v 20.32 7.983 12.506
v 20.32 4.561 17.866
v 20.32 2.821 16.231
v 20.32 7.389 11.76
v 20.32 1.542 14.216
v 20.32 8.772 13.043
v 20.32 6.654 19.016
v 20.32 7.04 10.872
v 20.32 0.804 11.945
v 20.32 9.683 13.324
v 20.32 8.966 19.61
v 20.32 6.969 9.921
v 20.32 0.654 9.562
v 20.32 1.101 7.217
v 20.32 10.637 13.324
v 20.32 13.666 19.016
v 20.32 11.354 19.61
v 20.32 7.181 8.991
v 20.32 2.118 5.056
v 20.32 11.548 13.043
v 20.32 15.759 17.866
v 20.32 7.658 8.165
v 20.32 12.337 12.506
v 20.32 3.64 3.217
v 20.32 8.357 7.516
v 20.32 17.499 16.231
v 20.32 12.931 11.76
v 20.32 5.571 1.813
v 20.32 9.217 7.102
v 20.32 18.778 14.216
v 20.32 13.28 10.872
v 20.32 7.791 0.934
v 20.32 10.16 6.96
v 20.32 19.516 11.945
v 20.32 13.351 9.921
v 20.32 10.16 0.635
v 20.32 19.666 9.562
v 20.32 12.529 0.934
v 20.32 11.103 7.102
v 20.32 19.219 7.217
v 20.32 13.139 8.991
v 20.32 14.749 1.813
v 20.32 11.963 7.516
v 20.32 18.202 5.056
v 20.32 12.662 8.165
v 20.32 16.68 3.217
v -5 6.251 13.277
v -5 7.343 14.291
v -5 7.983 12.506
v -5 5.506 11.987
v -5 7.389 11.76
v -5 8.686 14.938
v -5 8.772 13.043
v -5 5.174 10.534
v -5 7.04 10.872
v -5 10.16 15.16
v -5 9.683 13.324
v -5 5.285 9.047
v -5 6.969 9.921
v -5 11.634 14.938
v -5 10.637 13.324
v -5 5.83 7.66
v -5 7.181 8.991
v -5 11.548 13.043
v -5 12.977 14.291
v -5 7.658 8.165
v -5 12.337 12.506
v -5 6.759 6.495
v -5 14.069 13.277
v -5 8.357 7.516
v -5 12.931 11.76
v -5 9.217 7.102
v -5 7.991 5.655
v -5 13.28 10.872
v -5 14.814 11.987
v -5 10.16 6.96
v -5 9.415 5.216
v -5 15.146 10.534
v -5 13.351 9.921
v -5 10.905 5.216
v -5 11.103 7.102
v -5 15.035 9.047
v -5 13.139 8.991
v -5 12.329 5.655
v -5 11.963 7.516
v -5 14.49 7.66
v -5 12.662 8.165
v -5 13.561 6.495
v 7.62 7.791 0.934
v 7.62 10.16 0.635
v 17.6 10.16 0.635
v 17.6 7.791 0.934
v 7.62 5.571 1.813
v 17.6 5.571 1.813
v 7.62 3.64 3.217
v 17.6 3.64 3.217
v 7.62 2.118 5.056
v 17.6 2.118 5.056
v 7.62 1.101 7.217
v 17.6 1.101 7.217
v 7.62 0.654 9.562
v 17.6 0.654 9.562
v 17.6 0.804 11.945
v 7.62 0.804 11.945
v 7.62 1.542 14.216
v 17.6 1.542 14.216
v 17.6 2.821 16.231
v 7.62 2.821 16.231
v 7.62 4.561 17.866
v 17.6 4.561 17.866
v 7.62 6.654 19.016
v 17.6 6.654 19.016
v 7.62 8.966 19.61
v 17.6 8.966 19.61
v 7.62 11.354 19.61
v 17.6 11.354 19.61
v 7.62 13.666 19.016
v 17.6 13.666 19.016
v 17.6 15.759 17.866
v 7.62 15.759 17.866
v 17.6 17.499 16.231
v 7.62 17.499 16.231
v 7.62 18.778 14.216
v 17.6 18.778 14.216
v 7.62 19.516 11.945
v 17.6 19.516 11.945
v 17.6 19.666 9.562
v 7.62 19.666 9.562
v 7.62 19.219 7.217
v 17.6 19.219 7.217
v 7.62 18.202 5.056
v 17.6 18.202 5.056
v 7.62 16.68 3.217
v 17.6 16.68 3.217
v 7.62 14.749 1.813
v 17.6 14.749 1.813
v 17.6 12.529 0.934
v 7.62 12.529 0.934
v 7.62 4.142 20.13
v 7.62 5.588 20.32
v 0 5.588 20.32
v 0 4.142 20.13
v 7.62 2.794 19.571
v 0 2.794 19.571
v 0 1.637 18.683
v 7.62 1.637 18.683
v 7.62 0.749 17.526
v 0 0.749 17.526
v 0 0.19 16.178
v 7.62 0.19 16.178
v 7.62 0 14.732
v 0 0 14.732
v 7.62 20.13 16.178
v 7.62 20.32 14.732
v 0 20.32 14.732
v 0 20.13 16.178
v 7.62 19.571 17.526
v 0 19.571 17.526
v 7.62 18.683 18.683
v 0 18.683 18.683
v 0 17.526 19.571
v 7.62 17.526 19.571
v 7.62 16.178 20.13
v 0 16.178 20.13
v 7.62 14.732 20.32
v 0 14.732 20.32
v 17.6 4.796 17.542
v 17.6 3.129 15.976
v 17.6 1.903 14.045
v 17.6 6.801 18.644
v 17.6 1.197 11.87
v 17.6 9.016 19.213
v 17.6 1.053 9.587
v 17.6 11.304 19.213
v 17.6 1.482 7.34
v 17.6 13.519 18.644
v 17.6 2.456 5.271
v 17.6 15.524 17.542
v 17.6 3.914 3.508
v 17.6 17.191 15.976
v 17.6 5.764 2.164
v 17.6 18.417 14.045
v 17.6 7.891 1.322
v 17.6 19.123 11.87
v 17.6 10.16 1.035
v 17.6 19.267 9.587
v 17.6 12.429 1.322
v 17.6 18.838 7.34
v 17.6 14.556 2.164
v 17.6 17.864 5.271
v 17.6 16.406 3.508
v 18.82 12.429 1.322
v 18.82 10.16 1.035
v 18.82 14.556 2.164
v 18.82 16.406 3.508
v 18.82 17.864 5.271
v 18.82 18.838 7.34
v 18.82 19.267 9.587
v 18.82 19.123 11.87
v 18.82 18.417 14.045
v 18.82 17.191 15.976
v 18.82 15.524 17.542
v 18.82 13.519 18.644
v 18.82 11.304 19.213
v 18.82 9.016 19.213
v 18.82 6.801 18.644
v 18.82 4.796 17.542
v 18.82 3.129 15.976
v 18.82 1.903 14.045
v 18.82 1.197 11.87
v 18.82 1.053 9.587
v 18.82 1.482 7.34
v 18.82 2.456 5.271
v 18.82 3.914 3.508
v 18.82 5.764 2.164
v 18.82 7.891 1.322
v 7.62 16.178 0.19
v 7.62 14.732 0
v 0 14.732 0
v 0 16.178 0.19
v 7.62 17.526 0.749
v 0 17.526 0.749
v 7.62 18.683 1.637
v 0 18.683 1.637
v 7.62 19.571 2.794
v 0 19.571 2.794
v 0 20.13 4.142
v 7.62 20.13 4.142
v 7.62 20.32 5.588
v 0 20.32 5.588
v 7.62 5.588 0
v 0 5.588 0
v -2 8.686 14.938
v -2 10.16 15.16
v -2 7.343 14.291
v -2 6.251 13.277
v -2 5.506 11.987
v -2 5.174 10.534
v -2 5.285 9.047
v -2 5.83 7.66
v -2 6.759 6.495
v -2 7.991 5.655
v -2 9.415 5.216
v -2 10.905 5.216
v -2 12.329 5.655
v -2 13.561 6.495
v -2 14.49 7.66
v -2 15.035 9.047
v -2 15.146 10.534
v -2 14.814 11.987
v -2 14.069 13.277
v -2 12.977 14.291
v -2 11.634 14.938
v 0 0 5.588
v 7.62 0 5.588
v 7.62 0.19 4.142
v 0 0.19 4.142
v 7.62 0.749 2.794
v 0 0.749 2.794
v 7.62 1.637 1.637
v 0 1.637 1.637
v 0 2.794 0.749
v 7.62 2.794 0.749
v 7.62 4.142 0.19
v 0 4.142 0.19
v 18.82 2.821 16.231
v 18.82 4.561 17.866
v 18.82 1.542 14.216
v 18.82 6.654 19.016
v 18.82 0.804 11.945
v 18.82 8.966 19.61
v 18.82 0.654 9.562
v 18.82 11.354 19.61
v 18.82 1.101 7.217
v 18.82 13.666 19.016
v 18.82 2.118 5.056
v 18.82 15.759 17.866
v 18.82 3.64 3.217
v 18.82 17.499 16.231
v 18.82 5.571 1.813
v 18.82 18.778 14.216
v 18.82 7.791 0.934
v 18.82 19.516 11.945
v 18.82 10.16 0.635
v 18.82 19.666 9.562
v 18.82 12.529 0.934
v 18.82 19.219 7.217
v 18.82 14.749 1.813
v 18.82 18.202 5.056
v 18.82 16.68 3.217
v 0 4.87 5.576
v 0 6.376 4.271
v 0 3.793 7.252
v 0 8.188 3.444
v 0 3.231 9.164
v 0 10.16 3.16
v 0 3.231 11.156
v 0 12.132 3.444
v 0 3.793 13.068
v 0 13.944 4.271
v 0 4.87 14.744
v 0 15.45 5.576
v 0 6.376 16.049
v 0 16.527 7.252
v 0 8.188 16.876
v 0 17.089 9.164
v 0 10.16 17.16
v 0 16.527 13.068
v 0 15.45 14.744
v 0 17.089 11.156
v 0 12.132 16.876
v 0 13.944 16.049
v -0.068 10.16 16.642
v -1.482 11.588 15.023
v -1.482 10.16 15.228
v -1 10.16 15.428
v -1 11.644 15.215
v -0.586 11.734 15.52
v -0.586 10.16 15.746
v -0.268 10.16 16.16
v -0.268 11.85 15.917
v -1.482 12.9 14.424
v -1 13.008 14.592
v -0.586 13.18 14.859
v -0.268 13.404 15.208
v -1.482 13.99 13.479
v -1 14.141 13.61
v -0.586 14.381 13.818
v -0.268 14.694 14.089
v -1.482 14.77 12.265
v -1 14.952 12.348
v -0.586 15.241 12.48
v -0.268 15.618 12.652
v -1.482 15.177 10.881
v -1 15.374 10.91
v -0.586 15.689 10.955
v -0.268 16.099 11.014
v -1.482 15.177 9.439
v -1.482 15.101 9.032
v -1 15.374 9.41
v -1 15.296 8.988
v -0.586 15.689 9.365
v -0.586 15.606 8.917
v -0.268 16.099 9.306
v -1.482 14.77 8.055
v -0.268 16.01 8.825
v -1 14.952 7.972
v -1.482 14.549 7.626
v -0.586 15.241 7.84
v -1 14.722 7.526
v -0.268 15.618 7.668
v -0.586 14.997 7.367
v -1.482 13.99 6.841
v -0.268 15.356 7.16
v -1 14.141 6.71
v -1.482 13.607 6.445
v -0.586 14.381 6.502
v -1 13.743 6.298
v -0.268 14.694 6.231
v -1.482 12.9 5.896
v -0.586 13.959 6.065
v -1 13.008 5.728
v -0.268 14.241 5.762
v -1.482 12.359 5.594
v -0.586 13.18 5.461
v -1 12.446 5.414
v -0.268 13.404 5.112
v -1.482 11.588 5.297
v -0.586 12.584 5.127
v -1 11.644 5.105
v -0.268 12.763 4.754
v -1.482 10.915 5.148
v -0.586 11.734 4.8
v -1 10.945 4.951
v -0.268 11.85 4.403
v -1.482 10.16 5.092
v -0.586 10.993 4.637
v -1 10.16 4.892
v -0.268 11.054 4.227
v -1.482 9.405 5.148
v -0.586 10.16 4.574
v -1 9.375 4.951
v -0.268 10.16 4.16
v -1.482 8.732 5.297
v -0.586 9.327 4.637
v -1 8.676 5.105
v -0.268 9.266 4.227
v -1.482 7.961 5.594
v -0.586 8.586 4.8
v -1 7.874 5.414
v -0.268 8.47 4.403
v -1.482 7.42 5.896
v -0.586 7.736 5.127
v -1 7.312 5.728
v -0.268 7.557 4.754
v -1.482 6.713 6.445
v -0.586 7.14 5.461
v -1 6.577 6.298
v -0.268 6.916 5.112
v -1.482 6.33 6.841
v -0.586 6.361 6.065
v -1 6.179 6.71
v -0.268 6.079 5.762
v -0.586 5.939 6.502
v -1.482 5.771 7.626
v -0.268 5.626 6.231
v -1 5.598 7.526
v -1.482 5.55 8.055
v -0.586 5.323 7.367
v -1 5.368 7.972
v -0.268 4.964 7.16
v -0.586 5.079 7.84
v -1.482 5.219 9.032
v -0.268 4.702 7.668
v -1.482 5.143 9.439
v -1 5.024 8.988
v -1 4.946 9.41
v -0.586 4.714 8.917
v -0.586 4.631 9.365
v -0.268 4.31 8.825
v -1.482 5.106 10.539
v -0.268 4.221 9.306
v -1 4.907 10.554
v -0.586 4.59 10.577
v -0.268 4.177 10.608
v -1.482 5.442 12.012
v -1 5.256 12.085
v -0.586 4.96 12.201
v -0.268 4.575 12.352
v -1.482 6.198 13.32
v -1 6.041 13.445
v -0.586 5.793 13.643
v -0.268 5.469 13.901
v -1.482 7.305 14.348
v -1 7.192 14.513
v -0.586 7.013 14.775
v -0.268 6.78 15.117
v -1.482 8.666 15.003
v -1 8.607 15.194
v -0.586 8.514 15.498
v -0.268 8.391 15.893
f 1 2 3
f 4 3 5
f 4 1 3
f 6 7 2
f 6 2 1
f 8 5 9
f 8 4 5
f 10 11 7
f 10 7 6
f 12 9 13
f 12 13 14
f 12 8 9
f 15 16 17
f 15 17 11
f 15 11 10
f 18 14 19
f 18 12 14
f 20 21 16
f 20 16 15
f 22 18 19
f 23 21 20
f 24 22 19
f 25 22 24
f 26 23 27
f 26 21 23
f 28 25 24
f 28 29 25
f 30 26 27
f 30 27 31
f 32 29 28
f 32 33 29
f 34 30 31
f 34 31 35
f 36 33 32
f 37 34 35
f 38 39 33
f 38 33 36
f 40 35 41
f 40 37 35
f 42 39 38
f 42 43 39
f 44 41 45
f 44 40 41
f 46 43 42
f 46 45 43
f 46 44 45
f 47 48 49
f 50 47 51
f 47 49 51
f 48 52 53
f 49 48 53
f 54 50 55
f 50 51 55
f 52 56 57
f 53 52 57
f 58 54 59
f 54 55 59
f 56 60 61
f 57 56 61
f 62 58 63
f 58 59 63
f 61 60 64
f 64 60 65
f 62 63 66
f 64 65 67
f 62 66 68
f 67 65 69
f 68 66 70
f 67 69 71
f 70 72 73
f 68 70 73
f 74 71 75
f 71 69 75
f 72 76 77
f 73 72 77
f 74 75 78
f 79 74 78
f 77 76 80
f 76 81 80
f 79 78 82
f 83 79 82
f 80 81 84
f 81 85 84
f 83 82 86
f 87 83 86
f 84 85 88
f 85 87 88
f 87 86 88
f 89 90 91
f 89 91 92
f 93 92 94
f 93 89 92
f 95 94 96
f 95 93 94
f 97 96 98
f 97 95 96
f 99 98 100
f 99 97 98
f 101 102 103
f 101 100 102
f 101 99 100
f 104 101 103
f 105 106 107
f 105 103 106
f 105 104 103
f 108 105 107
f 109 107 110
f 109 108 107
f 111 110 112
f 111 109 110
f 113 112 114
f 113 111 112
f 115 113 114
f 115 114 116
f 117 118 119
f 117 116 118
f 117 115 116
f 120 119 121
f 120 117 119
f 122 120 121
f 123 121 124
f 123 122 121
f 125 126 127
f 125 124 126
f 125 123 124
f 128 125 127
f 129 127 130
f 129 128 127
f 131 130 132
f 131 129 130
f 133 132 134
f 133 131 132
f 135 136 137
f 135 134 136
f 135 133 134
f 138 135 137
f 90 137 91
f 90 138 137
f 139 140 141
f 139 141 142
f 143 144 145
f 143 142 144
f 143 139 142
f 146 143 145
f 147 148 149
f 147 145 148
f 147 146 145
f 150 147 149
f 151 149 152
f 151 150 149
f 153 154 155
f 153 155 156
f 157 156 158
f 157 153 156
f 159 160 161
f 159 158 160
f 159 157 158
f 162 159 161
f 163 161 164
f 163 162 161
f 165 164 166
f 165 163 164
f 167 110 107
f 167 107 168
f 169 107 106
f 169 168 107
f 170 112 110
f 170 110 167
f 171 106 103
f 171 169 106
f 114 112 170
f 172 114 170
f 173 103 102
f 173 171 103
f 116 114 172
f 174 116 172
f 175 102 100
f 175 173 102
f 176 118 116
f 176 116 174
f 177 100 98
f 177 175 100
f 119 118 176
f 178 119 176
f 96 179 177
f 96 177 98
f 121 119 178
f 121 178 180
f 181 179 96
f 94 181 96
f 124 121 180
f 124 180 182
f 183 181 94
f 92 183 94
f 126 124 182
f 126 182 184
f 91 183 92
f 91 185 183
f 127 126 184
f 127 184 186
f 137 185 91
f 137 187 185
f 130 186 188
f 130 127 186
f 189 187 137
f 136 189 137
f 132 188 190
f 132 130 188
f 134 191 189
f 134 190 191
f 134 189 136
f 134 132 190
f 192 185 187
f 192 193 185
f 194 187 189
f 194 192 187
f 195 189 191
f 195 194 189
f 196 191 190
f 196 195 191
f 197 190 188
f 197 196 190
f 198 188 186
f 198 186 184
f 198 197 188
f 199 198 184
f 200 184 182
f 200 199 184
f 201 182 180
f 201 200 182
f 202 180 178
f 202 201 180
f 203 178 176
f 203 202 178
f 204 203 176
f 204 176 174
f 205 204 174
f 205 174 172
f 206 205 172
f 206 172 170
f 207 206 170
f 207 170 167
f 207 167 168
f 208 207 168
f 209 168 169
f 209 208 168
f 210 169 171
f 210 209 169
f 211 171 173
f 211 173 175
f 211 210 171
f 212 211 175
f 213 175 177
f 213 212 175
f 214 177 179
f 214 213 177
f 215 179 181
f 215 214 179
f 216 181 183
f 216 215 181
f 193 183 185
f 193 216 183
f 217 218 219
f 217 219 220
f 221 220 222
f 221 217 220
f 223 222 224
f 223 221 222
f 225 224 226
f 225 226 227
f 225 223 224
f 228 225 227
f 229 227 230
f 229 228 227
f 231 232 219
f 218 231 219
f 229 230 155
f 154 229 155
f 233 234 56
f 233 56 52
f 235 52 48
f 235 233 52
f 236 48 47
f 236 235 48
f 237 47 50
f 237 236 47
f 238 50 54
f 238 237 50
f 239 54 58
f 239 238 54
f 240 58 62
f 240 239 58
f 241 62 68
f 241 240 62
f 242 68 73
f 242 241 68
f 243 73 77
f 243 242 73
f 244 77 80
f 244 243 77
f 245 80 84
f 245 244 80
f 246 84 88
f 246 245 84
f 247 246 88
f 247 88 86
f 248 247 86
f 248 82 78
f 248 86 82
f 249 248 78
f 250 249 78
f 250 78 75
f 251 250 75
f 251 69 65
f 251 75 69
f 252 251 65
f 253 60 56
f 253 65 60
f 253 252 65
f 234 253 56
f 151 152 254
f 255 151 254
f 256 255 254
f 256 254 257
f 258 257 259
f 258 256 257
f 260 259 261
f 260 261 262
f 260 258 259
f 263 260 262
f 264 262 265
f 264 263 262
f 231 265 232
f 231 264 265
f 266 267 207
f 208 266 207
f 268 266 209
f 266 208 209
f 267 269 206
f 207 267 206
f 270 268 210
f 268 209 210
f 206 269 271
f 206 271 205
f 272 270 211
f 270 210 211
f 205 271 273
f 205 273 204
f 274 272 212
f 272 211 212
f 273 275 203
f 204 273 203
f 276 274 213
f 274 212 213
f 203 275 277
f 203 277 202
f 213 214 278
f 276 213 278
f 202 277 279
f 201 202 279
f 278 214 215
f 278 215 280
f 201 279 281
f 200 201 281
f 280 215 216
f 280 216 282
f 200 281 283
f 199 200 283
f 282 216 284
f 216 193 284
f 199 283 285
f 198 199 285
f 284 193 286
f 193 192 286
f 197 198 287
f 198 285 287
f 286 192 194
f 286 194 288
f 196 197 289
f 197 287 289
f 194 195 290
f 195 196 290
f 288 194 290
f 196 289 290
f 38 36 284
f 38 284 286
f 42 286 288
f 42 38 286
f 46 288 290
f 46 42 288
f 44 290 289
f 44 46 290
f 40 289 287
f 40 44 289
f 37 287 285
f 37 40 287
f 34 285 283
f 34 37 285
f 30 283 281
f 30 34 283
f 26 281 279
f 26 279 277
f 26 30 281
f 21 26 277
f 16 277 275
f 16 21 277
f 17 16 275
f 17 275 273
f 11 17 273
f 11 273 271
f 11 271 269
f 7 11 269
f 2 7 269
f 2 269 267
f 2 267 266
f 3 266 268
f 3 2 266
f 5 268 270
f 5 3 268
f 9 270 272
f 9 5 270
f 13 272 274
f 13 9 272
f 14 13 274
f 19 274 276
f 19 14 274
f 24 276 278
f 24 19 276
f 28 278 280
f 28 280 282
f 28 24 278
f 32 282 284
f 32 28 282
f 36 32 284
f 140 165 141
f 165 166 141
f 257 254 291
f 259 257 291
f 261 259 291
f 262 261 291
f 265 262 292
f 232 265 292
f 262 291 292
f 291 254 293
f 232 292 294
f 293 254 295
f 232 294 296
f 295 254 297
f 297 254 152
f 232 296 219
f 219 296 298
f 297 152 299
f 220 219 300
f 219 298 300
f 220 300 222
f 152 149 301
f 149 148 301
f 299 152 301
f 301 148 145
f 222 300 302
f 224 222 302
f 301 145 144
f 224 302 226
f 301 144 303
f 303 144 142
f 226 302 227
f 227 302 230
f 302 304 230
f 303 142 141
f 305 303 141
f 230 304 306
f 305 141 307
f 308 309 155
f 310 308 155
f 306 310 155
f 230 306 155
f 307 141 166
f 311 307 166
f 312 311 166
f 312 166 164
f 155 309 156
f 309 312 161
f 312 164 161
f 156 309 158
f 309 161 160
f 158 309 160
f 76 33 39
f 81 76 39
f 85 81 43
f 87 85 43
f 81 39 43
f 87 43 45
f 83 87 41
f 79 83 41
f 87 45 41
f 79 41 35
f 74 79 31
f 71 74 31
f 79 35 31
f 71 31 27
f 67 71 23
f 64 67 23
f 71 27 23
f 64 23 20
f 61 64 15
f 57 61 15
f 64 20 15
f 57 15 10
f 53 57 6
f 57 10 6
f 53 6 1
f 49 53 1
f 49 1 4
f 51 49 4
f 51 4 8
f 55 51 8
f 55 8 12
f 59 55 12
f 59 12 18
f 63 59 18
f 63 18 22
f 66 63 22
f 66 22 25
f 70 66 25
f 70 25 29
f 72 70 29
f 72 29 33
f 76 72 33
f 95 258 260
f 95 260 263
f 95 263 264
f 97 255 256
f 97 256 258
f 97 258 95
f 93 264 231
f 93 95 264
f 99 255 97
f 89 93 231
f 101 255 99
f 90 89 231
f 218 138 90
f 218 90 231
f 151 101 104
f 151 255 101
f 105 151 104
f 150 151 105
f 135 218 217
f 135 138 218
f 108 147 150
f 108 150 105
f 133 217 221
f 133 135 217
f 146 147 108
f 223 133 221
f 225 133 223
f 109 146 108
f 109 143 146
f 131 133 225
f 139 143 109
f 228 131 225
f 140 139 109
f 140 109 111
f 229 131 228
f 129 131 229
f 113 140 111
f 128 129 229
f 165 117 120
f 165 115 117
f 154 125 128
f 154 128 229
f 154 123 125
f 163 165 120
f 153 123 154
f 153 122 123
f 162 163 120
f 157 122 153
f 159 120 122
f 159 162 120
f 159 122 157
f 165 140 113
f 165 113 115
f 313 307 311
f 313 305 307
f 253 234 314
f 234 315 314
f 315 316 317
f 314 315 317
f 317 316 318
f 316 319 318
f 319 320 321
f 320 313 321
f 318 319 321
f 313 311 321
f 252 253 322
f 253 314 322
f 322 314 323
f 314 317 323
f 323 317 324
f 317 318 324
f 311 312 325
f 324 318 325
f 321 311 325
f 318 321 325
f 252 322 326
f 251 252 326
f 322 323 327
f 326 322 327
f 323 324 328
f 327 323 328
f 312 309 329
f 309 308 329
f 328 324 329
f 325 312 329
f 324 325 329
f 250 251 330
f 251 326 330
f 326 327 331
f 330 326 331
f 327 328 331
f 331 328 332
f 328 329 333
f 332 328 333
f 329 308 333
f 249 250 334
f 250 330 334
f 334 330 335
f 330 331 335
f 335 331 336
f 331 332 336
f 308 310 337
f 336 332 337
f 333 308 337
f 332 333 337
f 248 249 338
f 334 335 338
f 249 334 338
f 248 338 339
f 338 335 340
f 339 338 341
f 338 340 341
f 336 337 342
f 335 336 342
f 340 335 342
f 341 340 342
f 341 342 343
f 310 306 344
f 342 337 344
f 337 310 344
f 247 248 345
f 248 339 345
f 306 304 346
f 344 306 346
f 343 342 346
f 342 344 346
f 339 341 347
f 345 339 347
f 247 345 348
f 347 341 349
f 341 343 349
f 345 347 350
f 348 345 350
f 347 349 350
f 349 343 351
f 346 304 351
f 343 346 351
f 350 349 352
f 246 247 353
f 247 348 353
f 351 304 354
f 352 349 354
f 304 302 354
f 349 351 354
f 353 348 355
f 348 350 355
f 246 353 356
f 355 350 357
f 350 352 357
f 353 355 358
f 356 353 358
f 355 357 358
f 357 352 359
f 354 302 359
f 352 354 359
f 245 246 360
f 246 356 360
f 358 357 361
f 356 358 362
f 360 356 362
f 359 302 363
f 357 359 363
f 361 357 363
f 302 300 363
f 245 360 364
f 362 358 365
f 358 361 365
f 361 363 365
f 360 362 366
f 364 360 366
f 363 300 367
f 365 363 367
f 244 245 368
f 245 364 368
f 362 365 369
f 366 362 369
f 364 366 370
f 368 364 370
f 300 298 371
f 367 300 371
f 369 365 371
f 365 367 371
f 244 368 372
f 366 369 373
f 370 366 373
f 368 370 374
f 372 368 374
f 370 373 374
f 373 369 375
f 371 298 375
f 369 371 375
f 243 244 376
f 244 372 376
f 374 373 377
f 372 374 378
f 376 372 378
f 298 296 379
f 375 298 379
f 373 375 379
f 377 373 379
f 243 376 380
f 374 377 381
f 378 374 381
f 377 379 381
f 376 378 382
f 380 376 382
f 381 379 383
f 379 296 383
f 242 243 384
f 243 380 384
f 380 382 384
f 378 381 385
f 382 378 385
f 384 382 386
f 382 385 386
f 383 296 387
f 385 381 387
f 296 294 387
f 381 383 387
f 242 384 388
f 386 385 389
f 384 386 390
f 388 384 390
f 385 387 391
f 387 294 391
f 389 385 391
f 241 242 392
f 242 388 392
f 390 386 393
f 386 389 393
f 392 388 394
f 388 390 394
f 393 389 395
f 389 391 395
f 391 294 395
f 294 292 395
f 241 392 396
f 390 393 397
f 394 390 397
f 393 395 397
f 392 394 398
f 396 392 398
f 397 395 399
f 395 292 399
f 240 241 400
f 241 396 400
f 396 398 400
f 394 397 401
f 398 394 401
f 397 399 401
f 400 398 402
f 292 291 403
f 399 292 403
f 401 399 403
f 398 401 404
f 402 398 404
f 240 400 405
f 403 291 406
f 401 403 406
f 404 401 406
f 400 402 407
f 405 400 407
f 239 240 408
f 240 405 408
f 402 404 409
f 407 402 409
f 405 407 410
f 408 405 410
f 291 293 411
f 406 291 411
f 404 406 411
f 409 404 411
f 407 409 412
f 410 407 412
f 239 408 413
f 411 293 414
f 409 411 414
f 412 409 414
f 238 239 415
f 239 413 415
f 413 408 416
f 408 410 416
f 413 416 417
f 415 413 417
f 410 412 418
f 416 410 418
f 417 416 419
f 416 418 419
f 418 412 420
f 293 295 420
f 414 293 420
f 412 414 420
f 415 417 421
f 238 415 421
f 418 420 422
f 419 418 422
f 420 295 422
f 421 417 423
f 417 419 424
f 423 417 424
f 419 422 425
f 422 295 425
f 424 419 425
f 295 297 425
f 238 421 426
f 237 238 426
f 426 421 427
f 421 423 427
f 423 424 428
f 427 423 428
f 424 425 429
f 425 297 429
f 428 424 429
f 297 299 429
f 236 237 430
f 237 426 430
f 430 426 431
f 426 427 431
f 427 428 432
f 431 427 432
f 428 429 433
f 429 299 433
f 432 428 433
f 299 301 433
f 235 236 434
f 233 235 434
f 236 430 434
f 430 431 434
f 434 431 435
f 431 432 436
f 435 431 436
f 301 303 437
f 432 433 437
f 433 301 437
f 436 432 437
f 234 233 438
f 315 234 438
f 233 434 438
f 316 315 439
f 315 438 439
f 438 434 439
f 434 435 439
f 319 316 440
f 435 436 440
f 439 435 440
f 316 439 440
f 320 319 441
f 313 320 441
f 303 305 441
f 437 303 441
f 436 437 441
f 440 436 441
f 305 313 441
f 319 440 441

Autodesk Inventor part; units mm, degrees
ref_plane "YZ Plane" through (0, 0, 0) normal (1, 0, 0) x (0, 1, 0)
ref_plane "XZ Plane" through (0, 0, 0) normal (0, 1, 0) x (-1, 0, 0)
ref_plane "XY Plane" through (0, 0, 0) normal (0, 0, 1) x (1, 0, 0)
sketch "Sketch1" plane through (0, 0, 0) normal (1, 0, 0) x (0, 1, 0)
  line L0 (0, 0) -> (20.32, 0)
  line L1 (20.32, 0) -> (20.32, 20.32)
  line L2 (20.32, 20.32) -> (0, 20.32)
  line L3 (0, 20.32) -> (0, 0)
  dimension "d0" = 20.32
  dimension "d1" = 20.32
extrude "Extrusion1" add sketch "Sketch1" along normal blind 7.62
sketch "Sketch2" plane through (7.62, 0, 0) normal (1, 0, 0) x (0, 0, -1)
  circle A0 centre (-10.16, 10.16) radius 9.525
  point P0 (0, 0)
  dimension "d4" = 19.05
extrude "Extrusion2" add sketch "Sketch2" along normal blind 12.7
fillet "Fillet1" radius 5.588 4 edges at (3.81, 20.32, 0) (3.81, 0, 0) (3.81, 0, 20.32) (3.81, 20.32, 20.32)
sketch "Sketch3" plane through (20.32, 10.16, 10.16) normal (1, 0, 0) x (0, 0, -1)
  circle A0 centre (0, 0) radius 9.525
  circle A1 centre (0, 0) radius 9.125
  point P0 (10.16, -10.16)
  dimension "d8" = 18.25
extrude "Extrusion3" cut sketch "Sketch3" against normal blind 2.72
sketch "Sketch4" plane through (20.32, 10.16, 10.16) normal (1, 0, 0) x (0, 0, -1)
  circle A0 centre (0, 0) radius 9.525
  point P0 (10.16, -10.16)
extrude "Extrusion4" add sketch "Sketch4" against normal blind 1.5
sketch "Sketch5" plane through (0, 0, 0) normal (-1, 0, 0) x (0, 0, 1)
  circle A0 centre (10.16, 10.16) radius 9.125 projected
  circle A1 centre (10.16, 10.16) radius 4
  point P0 (0, 0)
  dimension "d13" = 8
extrude "Extrusion5" cut sketch "Sketch5" against normal blind 25 contours A1
sketch "Sketch6" plane through (0, 0, 0) normal (-1, 0, 0) x (0, 0, 1)
  circle A0 centre (10.16, 10.16) radius 4 projected
  circle A1 centre (10.16, 10.16) radius 4
  circle A2 centre (10.16, 10.16) radius 5
  point P0 (0, 0)
  dimension "d16" = 10
extrude "Extrusion6" add sketch "Sketch6" along normal blind 5
fillet "Fillet2" radius 2 1 edges at (0, 10.16, 5.16)
sketch "Sketch7" plane through (20.32, 10.16, 10.16) normal (1, 0, 0) x (0, 0, -1)
  circle A0 centre (0, 0) radius 4 projected
  circle A1 centre (0, 0) radius 4
  circle A2 centre (0, 0) radius 3.2
  point P0 (10.16, -10.16)
  dimension "d20" = 6.4
extrude "Extrusion7" add sketch "Sketch7" against normal blind 25.32
properties part number "_3DPrint"
